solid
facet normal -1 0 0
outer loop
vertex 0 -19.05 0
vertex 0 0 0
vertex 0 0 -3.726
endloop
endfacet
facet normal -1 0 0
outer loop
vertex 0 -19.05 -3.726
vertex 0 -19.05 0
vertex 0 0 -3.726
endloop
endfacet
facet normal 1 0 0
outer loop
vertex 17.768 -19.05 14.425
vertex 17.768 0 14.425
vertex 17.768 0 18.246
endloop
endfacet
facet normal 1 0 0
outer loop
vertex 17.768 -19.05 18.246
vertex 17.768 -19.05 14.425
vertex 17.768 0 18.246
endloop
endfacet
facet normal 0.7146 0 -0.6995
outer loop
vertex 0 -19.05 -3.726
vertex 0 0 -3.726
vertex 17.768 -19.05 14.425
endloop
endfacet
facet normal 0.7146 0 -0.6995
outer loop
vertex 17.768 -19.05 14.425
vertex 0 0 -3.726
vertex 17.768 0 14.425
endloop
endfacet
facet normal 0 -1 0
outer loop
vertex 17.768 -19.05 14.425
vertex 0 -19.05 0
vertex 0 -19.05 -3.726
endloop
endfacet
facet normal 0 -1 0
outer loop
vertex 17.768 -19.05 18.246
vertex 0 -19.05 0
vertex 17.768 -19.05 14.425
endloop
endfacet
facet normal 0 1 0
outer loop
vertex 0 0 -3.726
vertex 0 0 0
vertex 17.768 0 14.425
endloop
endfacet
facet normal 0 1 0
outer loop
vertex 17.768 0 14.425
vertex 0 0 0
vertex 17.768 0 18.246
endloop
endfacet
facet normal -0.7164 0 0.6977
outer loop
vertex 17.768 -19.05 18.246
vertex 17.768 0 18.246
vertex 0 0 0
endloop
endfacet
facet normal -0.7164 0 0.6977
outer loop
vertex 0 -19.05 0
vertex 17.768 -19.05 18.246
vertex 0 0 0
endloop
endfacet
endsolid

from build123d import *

# Parameters (mm, degrees)
F1_DEPTH = 19.05


with BuildPart() as f1:
    # F0 (on Front) → F1 (new body)
    with BuildSketch(Plane.XZ):
        Polygon((17.768437, 18.246084), (0, 0), (0, -3.72564), (17.768437, 14.424915), align=None)
    extrude(amount=F1_DEPTH)


with BuildPart() as f2_1:
    # F2: copy of F1
    add(f1.part)


solid = f1.part
